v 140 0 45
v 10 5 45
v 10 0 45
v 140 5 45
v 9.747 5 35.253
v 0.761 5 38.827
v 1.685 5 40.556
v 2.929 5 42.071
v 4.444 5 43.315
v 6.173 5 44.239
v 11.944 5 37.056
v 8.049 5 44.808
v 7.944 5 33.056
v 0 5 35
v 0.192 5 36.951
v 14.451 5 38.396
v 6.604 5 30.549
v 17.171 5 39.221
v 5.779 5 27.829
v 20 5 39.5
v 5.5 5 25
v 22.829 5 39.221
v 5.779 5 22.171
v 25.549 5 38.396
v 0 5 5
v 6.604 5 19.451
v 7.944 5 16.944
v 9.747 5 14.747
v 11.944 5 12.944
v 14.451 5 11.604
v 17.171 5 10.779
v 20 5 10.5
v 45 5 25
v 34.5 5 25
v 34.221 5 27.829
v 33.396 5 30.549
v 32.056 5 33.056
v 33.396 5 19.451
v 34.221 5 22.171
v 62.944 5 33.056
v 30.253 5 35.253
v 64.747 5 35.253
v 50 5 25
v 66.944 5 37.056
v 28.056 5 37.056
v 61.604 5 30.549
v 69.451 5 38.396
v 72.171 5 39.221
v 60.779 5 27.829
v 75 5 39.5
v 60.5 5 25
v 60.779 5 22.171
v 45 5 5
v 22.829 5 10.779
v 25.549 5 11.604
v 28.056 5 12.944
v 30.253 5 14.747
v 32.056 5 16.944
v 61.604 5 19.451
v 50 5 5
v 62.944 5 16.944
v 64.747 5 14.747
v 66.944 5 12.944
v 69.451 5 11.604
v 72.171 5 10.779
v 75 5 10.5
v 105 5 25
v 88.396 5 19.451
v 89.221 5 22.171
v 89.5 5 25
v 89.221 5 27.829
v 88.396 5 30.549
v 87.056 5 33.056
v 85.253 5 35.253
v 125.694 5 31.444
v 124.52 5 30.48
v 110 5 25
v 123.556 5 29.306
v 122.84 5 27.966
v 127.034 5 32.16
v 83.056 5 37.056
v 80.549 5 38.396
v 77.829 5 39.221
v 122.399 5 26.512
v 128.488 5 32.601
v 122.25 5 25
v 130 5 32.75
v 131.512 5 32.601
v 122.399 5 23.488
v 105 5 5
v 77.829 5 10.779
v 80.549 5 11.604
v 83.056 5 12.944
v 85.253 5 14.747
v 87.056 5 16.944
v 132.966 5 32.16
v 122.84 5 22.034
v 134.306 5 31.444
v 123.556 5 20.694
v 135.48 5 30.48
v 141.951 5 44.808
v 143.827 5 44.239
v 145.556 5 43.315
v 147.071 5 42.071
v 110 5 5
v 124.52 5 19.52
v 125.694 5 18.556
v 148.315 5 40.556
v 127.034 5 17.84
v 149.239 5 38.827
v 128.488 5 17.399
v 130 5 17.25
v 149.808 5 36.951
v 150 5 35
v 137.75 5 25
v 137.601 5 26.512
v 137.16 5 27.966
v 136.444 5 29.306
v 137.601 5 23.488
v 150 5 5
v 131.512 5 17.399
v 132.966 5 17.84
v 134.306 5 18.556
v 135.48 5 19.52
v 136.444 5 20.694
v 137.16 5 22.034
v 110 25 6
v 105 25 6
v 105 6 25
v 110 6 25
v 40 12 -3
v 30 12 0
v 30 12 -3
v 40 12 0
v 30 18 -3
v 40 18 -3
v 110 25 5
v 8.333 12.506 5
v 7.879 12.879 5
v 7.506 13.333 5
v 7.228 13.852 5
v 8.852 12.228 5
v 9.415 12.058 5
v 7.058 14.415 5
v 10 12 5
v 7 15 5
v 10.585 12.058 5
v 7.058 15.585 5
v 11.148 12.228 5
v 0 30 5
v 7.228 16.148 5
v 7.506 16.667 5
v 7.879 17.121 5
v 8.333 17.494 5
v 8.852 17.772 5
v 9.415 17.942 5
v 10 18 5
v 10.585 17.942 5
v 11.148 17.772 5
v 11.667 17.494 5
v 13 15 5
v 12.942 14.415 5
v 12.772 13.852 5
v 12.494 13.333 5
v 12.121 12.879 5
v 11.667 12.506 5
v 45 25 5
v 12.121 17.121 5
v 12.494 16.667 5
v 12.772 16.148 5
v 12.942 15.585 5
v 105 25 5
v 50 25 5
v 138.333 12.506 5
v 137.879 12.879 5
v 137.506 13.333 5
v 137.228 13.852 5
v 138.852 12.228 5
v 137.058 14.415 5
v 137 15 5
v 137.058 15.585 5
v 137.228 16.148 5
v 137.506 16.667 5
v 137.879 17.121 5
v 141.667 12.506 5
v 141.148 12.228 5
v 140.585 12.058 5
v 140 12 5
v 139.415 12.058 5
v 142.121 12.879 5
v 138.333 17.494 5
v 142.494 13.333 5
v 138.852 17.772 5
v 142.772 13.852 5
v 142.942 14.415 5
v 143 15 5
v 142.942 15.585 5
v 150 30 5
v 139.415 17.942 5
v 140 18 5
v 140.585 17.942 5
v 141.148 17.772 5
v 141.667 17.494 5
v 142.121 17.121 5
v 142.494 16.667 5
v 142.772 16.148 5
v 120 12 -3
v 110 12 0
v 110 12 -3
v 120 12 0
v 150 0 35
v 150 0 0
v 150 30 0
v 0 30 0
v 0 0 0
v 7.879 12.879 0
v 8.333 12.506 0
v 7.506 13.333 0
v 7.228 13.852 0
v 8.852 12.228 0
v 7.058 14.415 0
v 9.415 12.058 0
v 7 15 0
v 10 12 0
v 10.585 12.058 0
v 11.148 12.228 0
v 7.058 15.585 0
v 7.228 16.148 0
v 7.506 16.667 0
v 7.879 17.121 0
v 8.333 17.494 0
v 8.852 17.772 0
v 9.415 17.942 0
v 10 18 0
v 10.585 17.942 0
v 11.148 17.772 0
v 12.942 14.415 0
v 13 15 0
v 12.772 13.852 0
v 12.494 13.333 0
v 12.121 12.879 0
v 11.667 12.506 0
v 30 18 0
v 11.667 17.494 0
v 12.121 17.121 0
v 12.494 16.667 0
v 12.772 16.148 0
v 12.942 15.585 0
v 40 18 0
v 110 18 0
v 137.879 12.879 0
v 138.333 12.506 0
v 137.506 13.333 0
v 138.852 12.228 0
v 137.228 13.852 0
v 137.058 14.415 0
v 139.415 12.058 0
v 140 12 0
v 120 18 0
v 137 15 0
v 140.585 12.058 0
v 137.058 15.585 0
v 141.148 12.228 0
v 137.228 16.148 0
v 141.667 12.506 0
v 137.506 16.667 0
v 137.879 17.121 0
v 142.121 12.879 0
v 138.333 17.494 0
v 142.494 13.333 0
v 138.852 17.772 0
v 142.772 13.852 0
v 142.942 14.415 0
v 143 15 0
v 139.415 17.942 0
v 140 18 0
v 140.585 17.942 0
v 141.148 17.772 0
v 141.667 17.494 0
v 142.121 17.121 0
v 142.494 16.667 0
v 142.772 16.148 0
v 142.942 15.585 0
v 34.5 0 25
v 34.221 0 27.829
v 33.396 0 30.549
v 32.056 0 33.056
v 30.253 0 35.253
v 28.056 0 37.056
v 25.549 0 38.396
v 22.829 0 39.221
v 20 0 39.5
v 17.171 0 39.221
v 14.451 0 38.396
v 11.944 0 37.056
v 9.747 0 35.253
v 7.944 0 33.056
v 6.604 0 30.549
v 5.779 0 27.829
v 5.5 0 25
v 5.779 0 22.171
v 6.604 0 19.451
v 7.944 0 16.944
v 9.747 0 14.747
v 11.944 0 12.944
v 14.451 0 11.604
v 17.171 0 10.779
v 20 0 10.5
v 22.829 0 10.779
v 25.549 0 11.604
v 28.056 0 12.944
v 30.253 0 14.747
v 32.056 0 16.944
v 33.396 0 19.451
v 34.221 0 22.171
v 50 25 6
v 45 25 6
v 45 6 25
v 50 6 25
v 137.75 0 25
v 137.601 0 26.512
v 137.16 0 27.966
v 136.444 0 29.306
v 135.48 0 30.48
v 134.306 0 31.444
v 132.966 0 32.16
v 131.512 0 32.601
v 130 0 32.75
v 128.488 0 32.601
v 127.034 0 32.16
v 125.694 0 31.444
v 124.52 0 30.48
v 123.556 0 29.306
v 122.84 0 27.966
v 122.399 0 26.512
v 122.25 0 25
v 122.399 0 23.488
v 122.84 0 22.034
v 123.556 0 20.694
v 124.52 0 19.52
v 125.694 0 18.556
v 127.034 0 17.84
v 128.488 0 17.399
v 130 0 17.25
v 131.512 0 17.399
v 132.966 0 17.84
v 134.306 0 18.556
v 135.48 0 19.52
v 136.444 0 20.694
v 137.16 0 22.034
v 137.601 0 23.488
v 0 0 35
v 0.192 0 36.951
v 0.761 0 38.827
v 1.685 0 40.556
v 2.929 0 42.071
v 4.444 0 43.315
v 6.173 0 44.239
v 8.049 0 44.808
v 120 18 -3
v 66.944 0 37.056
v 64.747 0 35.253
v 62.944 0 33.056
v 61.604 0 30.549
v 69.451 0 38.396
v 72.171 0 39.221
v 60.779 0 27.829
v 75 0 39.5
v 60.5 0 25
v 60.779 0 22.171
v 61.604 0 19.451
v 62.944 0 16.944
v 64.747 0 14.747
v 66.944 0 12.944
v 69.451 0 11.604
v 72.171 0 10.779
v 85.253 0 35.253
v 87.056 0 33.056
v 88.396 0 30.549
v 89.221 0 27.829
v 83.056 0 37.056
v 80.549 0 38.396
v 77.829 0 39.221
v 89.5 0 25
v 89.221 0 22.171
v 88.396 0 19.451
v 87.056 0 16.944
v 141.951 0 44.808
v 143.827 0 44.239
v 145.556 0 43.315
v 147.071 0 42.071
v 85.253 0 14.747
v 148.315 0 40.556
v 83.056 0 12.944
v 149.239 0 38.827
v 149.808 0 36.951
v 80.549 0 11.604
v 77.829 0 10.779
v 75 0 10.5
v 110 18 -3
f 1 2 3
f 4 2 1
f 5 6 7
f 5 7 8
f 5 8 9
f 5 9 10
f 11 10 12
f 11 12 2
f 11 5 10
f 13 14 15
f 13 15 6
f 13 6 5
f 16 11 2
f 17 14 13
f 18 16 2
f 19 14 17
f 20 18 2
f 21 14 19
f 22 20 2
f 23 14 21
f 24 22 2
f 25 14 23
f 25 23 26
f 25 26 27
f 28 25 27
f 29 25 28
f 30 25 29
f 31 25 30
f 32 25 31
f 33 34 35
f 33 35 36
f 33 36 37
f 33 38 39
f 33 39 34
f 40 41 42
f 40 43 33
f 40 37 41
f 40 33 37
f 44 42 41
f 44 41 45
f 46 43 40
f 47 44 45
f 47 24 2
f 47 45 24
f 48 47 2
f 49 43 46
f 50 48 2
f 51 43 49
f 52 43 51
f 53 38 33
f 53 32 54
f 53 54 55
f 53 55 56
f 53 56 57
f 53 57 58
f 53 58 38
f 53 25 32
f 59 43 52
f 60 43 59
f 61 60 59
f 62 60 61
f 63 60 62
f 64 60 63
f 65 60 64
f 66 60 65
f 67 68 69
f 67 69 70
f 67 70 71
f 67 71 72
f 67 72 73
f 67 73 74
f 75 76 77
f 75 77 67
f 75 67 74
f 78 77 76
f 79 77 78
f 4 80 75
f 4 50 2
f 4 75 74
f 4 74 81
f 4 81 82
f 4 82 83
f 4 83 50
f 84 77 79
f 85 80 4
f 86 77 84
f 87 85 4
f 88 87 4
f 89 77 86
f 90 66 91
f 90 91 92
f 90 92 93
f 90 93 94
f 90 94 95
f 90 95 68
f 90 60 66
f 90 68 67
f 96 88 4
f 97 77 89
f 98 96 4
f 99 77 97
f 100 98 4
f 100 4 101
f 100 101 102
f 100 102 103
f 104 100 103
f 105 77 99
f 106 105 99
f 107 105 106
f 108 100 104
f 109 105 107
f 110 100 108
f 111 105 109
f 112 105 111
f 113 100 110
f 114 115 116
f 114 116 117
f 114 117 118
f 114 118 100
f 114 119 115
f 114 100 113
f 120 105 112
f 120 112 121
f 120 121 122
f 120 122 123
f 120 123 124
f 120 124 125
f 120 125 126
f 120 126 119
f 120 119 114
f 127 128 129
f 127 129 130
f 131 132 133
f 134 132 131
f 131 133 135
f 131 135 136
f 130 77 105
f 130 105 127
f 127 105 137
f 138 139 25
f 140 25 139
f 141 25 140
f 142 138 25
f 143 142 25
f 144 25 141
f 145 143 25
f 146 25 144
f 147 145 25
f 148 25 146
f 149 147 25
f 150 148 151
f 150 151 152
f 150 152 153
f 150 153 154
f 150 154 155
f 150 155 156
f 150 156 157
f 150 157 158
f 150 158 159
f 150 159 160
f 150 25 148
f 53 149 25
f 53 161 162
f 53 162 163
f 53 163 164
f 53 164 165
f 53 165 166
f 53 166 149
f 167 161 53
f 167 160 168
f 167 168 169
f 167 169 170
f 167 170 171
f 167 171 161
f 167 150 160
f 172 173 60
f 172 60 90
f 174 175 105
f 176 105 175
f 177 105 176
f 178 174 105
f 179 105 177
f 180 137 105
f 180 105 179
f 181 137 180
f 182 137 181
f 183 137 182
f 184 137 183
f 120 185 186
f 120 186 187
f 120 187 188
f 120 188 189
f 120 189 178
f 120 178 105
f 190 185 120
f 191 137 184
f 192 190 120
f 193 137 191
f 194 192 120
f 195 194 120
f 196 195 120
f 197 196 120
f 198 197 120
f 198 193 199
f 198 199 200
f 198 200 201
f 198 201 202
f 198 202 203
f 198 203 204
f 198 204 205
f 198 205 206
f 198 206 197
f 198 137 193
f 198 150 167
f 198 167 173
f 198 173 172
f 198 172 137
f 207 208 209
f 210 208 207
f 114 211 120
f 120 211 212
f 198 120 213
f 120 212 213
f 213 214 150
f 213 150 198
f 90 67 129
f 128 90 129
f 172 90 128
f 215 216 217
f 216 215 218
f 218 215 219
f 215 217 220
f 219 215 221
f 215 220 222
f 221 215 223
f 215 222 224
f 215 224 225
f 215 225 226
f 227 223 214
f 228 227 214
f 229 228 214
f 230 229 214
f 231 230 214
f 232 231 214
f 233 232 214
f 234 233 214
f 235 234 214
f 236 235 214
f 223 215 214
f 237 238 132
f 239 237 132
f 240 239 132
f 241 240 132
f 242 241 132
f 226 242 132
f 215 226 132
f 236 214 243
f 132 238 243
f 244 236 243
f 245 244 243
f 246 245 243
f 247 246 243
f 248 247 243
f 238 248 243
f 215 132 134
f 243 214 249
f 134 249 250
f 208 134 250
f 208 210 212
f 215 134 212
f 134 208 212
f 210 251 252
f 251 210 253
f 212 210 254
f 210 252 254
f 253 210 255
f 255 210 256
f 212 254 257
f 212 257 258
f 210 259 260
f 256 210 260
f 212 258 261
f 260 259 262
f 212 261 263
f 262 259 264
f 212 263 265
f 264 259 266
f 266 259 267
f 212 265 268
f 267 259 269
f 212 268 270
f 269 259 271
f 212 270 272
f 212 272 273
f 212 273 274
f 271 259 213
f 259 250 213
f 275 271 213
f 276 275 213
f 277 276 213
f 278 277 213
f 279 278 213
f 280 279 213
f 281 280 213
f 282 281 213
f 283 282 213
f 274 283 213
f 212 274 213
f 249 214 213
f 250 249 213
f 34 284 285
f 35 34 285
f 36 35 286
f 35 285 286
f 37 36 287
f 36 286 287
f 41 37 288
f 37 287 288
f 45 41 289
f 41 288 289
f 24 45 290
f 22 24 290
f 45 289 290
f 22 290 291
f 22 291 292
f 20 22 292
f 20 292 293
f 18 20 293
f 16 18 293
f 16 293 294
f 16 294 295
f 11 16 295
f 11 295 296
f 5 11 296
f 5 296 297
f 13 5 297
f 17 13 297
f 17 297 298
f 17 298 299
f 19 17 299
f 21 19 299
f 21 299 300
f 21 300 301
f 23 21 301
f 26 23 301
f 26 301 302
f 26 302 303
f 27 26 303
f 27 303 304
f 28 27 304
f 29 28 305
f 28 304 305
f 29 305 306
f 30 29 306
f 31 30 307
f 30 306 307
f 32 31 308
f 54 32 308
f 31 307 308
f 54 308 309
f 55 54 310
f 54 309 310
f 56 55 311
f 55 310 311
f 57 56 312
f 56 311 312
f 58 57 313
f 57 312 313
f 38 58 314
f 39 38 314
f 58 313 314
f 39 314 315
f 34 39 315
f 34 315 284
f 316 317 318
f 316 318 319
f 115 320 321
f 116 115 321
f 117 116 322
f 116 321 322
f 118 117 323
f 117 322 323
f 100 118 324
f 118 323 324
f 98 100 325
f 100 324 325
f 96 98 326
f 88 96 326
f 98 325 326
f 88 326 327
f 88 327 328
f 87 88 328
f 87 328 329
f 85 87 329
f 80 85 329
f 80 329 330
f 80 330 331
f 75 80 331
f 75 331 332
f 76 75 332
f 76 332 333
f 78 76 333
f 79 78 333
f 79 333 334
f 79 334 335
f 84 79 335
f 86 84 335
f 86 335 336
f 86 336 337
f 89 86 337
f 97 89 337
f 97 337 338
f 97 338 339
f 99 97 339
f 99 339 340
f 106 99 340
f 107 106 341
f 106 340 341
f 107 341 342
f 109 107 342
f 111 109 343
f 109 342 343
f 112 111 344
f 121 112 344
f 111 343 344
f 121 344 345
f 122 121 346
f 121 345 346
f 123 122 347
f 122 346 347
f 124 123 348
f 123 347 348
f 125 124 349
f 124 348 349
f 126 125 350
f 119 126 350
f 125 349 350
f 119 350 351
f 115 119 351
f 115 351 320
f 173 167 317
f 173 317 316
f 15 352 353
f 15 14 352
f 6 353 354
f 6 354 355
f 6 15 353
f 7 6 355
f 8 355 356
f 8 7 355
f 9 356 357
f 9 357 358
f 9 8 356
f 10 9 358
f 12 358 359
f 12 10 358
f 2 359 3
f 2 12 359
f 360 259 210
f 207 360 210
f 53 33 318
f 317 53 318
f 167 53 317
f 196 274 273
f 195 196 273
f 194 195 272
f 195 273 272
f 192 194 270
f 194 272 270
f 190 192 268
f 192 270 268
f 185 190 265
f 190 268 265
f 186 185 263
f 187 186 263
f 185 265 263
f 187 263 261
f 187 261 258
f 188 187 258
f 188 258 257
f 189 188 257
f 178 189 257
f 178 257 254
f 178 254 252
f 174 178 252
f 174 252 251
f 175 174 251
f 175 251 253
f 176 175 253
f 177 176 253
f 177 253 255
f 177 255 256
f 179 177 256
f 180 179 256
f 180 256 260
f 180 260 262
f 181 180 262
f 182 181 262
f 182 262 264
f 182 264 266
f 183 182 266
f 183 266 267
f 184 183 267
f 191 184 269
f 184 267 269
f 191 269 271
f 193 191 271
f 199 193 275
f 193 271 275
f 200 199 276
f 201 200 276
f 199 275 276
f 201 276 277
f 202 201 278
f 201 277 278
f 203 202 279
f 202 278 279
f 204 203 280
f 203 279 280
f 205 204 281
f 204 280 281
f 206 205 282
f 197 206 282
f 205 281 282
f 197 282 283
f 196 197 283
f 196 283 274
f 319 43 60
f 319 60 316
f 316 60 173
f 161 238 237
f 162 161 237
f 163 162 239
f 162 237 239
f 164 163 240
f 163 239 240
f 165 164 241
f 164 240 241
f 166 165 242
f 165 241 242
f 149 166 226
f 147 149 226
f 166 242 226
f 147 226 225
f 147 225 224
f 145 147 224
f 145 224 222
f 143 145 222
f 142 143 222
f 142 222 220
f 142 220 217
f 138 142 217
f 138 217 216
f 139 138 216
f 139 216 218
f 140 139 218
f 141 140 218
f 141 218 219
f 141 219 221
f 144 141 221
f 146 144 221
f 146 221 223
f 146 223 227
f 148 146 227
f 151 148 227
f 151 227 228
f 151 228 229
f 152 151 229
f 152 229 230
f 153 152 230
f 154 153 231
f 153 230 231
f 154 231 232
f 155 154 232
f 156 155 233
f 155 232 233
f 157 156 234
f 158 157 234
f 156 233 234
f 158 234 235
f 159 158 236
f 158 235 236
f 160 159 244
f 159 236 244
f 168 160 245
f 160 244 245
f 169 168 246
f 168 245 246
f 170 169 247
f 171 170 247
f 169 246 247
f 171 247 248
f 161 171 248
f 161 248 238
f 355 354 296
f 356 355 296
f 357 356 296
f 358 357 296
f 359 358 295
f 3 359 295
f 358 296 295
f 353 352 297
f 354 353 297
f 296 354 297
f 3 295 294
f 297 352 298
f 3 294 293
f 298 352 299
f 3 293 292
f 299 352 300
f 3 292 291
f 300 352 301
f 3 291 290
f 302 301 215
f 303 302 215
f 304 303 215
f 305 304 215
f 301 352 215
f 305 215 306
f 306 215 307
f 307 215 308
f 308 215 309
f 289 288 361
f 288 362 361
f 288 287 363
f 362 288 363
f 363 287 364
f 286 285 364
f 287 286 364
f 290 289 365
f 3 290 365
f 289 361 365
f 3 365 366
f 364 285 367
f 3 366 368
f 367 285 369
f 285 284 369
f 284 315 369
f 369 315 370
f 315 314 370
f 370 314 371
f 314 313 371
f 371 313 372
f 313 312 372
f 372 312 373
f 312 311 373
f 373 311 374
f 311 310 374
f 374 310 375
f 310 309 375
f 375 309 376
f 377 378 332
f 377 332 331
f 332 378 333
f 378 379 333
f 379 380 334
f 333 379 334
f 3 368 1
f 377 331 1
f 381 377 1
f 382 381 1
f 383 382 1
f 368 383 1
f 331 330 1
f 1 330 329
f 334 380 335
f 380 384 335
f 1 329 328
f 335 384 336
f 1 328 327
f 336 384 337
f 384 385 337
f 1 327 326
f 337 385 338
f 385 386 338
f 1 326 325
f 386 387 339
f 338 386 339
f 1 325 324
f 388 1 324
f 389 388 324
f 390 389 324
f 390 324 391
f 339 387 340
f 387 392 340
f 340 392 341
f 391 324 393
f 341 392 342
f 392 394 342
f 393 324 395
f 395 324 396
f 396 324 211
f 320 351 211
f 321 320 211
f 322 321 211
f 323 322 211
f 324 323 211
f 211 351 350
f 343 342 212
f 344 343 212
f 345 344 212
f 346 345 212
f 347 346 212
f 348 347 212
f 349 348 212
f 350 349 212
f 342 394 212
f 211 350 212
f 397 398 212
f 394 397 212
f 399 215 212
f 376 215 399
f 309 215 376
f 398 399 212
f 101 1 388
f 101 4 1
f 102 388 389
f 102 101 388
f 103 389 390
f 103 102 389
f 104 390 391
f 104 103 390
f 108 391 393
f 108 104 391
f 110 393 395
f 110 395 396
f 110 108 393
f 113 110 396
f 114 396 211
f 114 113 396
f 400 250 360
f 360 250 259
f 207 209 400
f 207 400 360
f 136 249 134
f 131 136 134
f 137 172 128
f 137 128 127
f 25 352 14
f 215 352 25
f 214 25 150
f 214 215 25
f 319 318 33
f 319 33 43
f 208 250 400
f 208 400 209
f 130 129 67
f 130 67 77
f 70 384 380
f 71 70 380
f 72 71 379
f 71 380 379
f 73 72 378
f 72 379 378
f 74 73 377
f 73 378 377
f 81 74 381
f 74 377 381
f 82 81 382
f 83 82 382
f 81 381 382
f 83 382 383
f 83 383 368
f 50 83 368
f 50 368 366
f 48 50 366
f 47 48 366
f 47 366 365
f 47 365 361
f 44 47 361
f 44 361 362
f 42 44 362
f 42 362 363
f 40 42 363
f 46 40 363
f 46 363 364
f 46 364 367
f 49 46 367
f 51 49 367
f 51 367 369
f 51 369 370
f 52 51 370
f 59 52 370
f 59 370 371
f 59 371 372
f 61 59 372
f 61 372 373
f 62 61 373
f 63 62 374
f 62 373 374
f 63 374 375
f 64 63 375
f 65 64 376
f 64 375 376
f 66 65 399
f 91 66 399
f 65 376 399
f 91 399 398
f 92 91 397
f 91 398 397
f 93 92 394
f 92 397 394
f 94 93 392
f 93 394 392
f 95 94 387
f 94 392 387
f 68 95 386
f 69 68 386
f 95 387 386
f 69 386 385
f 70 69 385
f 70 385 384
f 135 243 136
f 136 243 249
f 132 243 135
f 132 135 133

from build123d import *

# Parameters (mm, degrees)
SKETCH_W        = 150
SKETCH_H        = 30
PAD_DEPTH       = 5
SKETCH001_W     = 150
SKETCH001_H     = 5
PAD001_DEPTH    = 40
SKETCH002_R     = 14.5
SKETCH002_R_2   = 7.75
POCKET_DEPTH    = 30.001
FILLET_R        = 10
SKETCH003_W     = 10
SKETCH003_H     = 6
PAD002_DEPTH    = 3
SKETCH005_W     = 5
SKETCH005_H     = 20
PAD003_DEPTH    = 20
CHAMFER_SIZE    = 19
SKETCH006_R     = 3
POCKET001_DEPTH = 45.001


with BuildPart() as part:
    # Sketch → Pad (new body)
    with BuildSketch(Plane.XY):
        with Locations((75, 15)):
            Rectangle(SKETCH_W, SKETCH_H)
    extrude(amount=PAD_DEPTH)

    # Sketch001 (on Face6 of Pad) → Pad001 (join)
    with BuildSketch(Plane.XY.offset(5)):
        with Locations((75, 2.5)):
            Rectangle(SKETCH001_W, SKETCH001_H)
    extrude(amount=PAD001_DEPTH)

    # Sketch002 (on Face5 of Pad001) → Pocket (cut, through all)
    with BuildSketch(Plane.XZ):
        with Locations((20, 25)):
            Circle(SKETCH002_R)
        with Locations((75, 25)):
            Circle(SKETCH002_R)
        with Locations((130, 25)):
            Circle(SKETCH002_R_2)
    extrude(amount=-POCKET_DEPTH, mode=Mode.SUBTRACT)

    # Fillet
    fillet_edges = [part.edges().sort_by_distance(p)[0] for p in [
        (150, 2.5, 45),
        (0, 2.5, 45),
    ]]
    fillet(fillet_edges, radius=FILLET_R)

    # Sketch003 → Pad002 (join)
    with BuildSketch(Plane(origin=(0, 0, 0), x_dir=(1, 0, 0), z_dir=(0, 0, -1))):
        with Locations((35, -15)):
            Rectangle(SKETCH003_W, SKETCH003_H)
        with Locations((115, -15)):
            Rectangle(SKETCH003_W, SKETCH003_H)
    extrude(amount=PAD002_DEPTH)

    # Sketch005 → Pad003 (join)
    with BuildSketch(Plane.XY.offset(5)):
        with Locations((47.5, 15)):
            Rectangle(SKETCH005_W, SKETCH005_H)
        with Locations((107.5, 15)):
            Rectangle(SKETCH005_W, SKETCH005_H)
    extrude(amount=PAD003_DEPTH)

    # Chamfer
    chamfer_edges = [part.edges().sort_by_distance(p)[0] for p in [
        (107.5, 25, 25),
        (47.5, 25, 25),
    ]]
    chamfer(chamfer_edges, length=CHAMFER_SIZE)

    # Sketch006 (on Face23 of Chamfer) → Pocket001 (cut, through all)
    with BuildSketch(Plane(origin=(0, 0, 0), x_dir=(1, 0, 0), z_dir=(0, 0, -1))):
        with Locations((10, -15)):
            Circle(SKETCH006_R)
        with Locations((140, -15)):
            Circle(SKETCH006_R)
    extrude(amount=-POCKET001_DEPTH, mode=Mode.SUBTRACT)


solid = part.part
